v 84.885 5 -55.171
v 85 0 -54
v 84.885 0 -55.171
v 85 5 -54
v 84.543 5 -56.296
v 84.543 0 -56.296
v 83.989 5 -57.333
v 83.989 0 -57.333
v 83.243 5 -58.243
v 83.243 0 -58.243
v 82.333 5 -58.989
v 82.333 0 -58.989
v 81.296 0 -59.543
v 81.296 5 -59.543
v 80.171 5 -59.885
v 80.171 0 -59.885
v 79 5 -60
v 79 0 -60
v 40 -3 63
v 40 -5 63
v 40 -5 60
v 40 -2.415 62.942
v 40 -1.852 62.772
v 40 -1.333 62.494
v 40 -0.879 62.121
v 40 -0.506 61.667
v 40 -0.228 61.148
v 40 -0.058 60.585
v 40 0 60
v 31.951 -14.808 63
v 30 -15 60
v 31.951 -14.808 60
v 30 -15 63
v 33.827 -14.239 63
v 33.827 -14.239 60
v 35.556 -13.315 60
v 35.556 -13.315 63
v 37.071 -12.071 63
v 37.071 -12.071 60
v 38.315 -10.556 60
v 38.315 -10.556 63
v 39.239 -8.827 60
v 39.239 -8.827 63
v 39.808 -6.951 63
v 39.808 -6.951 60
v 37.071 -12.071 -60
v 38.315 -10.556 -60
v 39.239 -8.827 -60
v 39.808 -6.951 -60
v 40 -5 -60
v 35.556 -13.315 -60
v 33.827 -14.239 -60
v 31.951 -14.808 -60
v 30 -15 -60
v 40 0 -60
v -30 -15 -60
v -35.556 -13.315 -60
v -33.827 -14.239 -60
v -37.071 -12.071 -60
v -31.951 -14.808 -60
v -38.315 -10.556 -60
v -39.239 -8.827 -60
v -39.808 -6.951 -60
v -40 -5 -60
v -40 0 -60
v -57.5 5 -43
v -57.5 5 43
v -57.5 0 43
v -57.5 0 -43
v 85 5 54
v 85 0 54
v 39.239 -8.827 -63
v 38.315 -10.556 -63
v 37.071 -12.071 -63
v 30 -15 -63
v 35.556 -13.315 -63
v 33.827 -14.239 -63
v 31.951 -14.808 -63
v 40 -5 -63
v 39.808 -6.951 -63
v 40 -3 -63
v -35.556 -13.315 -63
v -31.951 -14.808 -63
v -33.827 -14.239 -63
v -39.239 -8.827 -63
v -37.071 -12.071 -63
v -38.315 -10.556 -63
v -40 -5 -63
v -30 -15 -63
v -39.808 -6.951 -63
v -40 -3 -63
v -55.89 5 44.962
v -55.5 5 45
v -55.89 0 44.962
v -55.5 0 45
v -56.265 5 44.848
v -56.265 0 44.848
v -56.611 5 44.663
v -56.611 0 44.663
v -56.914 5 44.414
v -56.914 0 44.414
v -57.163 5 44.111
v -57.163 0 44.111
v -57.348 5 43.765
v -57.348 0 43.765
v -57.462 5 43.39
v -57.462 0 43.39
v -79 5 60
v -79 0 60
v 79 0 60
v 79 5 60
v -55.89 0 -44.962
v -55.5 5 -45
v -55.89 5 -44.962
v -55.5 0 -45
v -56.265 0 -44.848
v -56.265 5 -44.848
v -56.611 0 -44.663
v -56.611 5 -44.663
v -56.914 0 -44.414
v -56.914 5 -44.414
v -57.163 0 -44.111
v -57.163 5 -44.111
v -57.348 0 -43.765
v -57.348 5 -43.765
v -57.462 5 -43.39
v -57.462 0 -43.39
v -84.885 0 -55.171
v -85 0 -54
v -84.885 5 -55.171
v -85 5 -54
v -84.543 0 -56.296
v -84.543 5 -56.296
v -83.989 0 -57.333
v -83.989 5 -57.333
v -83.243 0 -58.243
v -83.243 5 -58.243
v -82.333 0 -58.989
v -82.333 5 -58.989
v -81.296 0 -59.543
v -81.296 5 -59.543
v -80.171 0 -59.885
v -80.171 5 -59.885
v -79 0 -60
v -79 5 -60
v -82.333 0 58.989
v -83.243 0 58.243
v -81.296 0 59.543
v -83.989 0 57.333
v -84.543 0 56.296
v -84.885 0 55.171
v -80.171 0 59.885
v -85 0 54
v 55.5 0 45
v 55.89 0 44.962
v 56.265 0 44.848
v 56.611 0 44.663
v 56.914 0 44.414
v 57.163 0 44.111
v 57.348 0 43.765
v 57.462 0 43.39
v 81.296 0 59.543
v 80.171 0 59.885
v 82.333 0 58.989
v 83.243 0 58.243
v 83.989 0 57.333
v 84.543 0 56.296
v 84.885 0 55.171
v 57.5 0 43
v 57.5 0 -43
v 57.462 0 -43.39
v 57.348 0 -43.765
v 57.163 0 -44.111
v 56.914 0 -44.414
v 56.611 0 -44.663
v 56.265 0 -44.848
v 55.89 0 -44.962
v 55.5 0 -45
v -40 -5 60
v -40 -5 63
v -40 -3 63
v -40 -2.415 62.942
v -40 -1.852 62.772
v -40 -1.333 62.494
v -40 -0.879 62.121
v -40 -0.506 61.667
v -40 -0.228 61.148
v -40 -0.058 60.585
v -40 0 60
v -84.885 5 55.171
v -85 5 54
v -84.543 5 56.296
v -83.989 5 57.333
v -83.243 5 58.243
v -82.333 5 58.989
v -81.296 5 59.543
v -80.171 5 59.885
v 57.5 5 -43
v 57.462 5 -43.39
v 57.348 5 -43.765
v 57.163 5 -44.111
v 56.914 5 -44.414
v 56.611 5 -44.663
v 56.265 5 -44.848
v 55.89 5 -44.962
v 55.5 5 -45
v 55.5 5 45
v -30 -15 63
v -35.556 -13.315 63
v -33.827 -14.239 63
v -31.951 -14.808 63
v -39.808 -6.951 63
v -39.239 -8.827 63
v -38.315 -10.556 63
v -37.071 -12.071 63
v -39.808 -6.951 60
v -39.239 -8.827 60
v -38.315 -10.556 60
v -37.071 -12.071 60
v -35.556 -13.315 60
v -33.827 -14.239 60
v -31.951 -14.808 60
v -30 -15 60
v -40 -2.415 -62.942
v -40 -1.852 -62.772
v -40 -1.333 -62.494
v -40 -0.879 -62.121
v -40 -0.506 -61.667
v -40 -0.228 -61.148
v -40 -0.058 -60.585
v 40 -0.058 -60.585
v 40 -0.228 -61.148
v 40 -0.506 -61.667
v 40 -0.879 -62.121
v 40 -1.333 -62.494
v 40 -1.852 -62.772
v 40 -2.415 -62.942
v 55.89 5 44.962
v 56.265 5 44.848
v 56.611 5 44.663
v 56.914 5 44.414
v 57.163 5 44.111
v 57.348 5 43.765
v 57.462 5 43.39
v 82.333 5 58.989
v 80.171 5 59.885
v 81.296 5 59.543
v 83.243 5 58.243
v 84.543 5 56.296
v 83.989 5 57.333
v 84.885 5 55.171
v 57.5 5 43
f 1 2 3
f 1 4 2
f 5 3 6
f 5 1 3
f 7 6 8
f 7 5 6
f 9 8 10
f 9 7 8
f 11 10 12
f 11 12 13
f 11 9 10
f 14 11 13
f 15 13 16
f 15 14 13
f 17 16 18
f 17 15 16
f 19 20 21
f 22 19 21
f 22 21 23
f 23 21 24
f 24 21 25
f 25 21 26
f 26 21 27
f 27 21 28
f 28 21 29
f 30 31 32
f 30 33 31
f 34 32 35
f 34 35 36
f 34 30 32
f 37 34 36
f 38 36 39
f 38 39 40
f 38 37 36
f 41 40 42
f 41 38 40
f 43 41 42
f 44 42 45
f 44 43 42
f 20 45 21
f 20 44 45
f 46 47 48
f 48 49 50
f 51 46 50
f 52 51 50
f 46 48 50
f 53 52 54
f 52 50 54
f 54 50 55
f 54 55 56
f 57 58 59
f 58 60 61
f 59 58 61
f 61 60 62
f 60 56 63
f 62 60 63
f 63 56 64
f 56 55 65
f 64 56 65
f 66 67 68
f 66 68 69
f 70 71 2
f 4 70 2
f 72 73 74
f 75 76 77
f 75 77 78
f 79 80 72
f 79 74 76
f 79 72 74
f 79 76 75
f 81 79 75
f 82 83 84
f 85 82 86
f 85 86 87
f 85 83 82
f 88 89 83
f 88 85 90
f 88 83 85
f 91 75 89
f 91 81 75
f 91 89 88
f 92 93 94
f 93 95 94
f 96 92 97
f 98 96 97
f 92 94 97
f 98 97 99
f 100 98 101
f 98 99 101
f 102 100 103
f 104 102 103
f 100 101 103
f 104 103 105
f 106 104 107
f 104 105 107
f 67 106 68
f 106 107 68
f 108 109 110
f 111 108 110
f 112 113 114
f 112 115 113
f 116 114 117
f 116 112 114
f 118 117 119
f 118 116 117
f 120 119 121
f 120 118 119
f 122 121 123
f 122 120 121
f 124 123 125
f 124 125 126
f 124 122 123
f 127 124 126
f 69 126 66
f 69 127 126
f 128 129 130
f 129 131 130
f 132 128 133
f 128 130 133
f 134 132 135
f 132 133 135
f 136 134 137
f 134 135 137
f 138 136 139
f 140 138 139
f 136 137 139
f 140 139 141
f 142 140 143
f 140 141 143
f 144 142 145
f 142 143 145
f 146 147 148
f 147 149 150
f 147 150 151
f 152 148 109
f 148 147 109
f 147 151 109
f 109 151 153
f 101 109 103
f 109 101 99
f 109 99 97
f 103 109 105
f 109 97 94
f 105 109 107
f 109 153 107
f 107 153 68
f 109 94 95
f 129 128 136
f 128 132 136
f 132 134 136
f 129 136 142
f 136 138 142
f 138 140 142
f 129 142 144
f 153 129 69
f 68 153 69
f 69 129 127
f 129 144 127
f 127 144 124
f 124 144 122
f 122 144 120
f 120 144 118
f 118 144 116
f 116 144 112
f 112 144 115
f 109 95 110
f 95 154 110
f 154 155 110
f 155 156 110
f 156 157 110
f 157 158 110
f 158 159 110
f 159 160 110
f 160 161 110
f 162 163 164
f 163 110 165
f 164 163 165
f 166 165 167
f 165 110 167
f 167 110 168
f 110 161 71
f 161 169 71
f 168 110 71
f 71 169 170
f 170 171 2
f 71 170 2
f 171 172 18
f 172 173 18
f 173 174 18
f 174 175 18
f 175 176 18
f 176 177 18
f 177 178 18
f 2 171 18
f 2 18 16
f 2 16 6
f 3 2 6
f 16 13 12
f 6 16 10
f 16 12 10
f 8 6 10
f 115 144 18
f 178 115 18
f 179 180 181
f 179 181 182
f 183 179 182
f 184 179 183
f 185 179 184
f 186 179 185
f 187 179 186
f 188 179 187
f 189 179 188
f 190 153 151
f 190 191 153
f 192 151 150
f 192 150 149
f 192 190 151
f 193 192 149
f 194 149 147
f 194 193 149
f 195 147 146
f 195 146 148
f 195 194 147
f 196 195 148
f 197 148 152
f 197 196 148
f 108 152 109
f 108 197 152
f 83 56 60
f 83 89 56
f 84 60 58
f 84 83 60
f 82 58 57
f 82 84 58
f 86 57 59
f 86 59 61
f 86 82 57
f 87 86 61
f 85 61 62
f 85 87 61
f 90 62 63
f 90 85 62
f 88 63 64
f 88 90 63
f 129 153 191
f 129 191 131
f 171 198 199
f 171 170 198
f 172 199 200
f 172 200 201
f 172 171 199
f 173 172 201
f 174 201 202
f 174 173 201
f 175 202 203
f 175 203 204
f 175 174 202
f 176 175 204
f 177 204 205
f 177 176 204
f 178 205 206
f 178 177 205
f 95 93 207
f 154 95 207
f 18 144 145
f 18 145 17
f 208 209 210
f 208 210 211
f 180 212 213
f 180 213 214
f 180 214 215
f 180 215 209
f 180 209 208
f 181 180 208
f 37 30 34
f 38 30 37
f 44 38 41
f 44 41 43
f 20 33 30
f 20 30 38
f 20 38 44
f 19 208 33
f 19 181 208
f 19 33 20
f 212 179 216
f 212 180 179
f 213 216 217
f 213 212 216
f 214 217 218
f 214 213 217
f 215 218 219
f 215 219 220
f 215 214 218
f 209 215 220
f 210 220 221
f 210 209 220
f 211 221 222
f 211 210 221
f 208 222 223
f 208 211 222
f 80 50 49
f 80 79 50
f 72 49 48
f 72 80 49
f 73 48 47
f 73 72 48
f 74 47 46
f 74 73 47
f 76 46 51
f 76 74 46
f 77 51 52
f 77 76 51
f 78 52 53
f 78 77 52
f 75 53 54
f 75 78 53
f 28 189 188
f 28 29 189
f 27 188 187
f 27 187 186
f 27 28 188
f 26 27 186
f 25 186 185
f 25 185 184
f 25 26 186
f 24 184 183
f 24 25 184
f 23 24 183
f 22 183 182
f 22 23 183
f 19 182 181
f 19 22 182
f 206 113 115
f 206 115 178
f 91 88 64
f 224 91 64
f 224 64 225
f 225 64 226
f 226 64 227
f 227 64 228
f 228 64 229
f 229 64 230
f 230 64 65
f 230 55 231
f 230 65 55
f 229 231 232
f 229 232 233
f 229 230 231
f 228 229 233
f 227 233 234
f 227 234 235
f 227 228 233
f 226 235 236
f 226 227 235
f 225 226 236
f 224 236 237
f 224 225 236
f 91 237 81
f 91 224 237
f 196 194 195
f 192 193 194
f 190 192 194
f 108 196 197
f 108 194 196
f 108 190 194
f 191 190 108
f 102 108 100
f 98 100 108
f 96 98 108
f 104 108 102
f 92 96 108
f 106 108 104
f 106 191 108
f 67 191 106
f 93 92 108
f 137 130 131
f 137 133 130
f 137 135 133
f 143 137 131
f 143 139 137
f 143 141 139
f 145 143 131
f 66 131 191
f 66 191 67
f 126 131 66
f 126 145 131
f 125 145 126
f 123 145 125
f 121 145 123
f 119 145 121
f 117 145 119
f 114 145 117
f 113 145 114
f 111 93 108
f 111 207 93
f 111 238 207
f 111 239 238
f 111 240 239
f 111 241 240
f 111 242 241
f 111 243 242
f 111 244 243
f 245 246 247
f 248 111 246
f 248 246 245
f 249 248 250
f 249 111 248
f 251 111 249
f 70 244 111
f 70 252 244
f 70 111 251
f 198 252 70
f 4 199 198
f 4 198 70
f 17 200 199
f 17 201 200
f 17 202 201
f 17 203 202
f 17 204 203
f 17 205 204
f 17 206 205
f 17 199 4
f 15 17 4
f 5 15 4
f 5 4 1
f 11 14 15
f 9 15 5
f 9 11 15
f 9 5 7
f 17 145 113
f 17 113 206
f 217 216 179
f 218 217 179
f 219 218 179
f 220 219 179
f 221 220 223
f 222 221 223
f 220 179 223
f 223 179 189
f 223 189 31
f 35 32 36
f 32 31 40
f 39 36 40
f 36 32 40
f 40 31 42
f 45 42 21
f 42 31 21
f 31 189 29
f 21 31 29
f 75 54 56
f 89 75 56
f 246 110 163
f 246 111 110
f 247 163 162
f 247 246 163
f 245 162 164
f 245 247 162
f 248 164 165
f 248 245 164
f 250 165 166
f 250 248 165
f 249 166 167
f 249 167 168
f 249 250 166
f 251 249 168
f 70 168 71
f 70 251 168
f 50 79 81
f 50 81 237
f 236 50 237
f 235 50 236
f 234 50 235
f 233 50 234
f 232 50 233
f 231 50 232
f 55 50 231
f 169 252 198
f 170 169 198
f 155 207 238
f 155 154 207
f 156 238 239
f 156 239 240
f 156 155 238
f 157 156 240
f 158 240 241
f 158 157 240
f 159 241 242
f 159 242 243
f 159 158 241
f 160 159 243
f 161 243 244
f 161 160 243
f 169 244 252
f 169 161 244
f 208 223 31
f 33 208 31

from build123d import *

# Parameters (mm, degrees)
SKETCH1_W           = 170
SKETCH1_H           = 120
BOSS_EXTRUDE1_DEPTH = 5
FILLET1_R           = 6
SKETCH2_W           = 115
SKETCH2_H           = 90
CUT_EXTRUDE1_DEPTH  = 10
FILLET2_R           = 2
SKETCH3_W           = 80
SKETCH3_H           = 15
BOSS_EXTRUDE2_DEPTH = 3
FILLET3_R           = 10
FILLET4_R           = 3
SKETCH4_W           = 80
SKETCH4_H           = 15
BOSS_EXTRUDE3_DEPTH = 3
FILLET5_R           = 3
FILLET6_R           = 10


with BuildPart() as part:
    # Sketch1 → Boss-Extrude1 (new body)
    with BuildSketch(Plane(origin=(0, 0, 0), x_dir=(1, 0, 0), z_dir=(0, 1, 0))):
        Rectangle(SKETCH1_W, SKETCH1_H)
    extrude(amount=BOSS_EXTRUDE1_DEPTH)

    # Fillet1
    fillet1_edges = [part.edges().sort_by_distance(p)[0] for p in [
        (85, 2.5, 60),
        (-85, 2.5, 60),
        (-85, 2.5, -60),
        (85, 2.5, -60),
    ]]
    fillet(fillet1_edges, radius=FILLET1_R)

    # Sketch2 → Cut-Extrude1 (cut)
    with BuildSketch(Plane(origin=(0, 5, 0), x_dir=(1, 0, 0), z_dir=(0, 1, 0))):
        Rectangle(SKETCH2_W, SKETCH2_H)
    extrude(amount=-CUT_EXTRUDE1_DEPTH, mode=Mode.SUBTRACT)

    # Fillet2
    fillet2_edges = [part.edges().sort_by_distance(p)[0] for p in [
        (57.5, 2.5, -45),
        (57.5, 2.5, 45),
        (-57.5, 2.5, 45),
        (-57.5, 2.5, -45),
    ]]
    fillet(fillet2_edges, radius=FILLET2_R)


with BuildPart() as body_2:
    # Sketch3 → Boss-Extrude2 (new body)
    with BuildSketch(Plane.XY.offset(60)):
        with Locations((0, -7.5)):
            Rectangle(SKETCH3_W, SKETCH3_H)
    extrude(amount=BOSS_EXTRUDE2_DEPTH)

    # Fillet3
    fillet3_edges = [body_2.edges().sort_by_distance(p)[0] for p in [
        (40, -15, 61.5),
        (-40, -15, 61.5),
    ]]
    fillet(fillet3_edges, radius=FILLET3_R)

    # Fillet4
    fillet4_edges = [body_2.edges().sort_by_distance(p)[0] for p in [
        (0, 0, 63),
    ]]
    fillet(fillet4_edges, radius=FILLET4_R - 0.0001)  # a hair under: the kernel refuses the full size


with BuildPart() as body_3:
    # Sketch4 → Boss-Extrude3 (new body)
    with BuildSketch(Plane(origin=(0, 0, -60), x_dir=(-1, 0, 0), z_dir=(0, 0, -1))):
        with Locations((0, -7.5)):
            Rectangle(SKETCH4_W, SKETCH4_H)
    extrude(amount=BOSS_EXTRUDE3_DEPTH)

    # Fillet5
    fillet5_edges = [body_3.edges().sort_by_distance(p)[0] for p in [
        (0, 0, -63),
    ]]
    fillet(fillet5_edges, radius=FILLET5_R - 0.0001)  # a hair under: the kernel refuses the full size

    # Fillet6
    fillet6_edges = [body_3.edges().sort_by_distance(p)[0] for p in [
        (-40, -15, -61.5),
        (40, -15, -61.5),
    ]]
    fillet(fillet6_edges, radius=FILLET6_R)


solid = Compound([part.part, body_2.part, body_3.part])
